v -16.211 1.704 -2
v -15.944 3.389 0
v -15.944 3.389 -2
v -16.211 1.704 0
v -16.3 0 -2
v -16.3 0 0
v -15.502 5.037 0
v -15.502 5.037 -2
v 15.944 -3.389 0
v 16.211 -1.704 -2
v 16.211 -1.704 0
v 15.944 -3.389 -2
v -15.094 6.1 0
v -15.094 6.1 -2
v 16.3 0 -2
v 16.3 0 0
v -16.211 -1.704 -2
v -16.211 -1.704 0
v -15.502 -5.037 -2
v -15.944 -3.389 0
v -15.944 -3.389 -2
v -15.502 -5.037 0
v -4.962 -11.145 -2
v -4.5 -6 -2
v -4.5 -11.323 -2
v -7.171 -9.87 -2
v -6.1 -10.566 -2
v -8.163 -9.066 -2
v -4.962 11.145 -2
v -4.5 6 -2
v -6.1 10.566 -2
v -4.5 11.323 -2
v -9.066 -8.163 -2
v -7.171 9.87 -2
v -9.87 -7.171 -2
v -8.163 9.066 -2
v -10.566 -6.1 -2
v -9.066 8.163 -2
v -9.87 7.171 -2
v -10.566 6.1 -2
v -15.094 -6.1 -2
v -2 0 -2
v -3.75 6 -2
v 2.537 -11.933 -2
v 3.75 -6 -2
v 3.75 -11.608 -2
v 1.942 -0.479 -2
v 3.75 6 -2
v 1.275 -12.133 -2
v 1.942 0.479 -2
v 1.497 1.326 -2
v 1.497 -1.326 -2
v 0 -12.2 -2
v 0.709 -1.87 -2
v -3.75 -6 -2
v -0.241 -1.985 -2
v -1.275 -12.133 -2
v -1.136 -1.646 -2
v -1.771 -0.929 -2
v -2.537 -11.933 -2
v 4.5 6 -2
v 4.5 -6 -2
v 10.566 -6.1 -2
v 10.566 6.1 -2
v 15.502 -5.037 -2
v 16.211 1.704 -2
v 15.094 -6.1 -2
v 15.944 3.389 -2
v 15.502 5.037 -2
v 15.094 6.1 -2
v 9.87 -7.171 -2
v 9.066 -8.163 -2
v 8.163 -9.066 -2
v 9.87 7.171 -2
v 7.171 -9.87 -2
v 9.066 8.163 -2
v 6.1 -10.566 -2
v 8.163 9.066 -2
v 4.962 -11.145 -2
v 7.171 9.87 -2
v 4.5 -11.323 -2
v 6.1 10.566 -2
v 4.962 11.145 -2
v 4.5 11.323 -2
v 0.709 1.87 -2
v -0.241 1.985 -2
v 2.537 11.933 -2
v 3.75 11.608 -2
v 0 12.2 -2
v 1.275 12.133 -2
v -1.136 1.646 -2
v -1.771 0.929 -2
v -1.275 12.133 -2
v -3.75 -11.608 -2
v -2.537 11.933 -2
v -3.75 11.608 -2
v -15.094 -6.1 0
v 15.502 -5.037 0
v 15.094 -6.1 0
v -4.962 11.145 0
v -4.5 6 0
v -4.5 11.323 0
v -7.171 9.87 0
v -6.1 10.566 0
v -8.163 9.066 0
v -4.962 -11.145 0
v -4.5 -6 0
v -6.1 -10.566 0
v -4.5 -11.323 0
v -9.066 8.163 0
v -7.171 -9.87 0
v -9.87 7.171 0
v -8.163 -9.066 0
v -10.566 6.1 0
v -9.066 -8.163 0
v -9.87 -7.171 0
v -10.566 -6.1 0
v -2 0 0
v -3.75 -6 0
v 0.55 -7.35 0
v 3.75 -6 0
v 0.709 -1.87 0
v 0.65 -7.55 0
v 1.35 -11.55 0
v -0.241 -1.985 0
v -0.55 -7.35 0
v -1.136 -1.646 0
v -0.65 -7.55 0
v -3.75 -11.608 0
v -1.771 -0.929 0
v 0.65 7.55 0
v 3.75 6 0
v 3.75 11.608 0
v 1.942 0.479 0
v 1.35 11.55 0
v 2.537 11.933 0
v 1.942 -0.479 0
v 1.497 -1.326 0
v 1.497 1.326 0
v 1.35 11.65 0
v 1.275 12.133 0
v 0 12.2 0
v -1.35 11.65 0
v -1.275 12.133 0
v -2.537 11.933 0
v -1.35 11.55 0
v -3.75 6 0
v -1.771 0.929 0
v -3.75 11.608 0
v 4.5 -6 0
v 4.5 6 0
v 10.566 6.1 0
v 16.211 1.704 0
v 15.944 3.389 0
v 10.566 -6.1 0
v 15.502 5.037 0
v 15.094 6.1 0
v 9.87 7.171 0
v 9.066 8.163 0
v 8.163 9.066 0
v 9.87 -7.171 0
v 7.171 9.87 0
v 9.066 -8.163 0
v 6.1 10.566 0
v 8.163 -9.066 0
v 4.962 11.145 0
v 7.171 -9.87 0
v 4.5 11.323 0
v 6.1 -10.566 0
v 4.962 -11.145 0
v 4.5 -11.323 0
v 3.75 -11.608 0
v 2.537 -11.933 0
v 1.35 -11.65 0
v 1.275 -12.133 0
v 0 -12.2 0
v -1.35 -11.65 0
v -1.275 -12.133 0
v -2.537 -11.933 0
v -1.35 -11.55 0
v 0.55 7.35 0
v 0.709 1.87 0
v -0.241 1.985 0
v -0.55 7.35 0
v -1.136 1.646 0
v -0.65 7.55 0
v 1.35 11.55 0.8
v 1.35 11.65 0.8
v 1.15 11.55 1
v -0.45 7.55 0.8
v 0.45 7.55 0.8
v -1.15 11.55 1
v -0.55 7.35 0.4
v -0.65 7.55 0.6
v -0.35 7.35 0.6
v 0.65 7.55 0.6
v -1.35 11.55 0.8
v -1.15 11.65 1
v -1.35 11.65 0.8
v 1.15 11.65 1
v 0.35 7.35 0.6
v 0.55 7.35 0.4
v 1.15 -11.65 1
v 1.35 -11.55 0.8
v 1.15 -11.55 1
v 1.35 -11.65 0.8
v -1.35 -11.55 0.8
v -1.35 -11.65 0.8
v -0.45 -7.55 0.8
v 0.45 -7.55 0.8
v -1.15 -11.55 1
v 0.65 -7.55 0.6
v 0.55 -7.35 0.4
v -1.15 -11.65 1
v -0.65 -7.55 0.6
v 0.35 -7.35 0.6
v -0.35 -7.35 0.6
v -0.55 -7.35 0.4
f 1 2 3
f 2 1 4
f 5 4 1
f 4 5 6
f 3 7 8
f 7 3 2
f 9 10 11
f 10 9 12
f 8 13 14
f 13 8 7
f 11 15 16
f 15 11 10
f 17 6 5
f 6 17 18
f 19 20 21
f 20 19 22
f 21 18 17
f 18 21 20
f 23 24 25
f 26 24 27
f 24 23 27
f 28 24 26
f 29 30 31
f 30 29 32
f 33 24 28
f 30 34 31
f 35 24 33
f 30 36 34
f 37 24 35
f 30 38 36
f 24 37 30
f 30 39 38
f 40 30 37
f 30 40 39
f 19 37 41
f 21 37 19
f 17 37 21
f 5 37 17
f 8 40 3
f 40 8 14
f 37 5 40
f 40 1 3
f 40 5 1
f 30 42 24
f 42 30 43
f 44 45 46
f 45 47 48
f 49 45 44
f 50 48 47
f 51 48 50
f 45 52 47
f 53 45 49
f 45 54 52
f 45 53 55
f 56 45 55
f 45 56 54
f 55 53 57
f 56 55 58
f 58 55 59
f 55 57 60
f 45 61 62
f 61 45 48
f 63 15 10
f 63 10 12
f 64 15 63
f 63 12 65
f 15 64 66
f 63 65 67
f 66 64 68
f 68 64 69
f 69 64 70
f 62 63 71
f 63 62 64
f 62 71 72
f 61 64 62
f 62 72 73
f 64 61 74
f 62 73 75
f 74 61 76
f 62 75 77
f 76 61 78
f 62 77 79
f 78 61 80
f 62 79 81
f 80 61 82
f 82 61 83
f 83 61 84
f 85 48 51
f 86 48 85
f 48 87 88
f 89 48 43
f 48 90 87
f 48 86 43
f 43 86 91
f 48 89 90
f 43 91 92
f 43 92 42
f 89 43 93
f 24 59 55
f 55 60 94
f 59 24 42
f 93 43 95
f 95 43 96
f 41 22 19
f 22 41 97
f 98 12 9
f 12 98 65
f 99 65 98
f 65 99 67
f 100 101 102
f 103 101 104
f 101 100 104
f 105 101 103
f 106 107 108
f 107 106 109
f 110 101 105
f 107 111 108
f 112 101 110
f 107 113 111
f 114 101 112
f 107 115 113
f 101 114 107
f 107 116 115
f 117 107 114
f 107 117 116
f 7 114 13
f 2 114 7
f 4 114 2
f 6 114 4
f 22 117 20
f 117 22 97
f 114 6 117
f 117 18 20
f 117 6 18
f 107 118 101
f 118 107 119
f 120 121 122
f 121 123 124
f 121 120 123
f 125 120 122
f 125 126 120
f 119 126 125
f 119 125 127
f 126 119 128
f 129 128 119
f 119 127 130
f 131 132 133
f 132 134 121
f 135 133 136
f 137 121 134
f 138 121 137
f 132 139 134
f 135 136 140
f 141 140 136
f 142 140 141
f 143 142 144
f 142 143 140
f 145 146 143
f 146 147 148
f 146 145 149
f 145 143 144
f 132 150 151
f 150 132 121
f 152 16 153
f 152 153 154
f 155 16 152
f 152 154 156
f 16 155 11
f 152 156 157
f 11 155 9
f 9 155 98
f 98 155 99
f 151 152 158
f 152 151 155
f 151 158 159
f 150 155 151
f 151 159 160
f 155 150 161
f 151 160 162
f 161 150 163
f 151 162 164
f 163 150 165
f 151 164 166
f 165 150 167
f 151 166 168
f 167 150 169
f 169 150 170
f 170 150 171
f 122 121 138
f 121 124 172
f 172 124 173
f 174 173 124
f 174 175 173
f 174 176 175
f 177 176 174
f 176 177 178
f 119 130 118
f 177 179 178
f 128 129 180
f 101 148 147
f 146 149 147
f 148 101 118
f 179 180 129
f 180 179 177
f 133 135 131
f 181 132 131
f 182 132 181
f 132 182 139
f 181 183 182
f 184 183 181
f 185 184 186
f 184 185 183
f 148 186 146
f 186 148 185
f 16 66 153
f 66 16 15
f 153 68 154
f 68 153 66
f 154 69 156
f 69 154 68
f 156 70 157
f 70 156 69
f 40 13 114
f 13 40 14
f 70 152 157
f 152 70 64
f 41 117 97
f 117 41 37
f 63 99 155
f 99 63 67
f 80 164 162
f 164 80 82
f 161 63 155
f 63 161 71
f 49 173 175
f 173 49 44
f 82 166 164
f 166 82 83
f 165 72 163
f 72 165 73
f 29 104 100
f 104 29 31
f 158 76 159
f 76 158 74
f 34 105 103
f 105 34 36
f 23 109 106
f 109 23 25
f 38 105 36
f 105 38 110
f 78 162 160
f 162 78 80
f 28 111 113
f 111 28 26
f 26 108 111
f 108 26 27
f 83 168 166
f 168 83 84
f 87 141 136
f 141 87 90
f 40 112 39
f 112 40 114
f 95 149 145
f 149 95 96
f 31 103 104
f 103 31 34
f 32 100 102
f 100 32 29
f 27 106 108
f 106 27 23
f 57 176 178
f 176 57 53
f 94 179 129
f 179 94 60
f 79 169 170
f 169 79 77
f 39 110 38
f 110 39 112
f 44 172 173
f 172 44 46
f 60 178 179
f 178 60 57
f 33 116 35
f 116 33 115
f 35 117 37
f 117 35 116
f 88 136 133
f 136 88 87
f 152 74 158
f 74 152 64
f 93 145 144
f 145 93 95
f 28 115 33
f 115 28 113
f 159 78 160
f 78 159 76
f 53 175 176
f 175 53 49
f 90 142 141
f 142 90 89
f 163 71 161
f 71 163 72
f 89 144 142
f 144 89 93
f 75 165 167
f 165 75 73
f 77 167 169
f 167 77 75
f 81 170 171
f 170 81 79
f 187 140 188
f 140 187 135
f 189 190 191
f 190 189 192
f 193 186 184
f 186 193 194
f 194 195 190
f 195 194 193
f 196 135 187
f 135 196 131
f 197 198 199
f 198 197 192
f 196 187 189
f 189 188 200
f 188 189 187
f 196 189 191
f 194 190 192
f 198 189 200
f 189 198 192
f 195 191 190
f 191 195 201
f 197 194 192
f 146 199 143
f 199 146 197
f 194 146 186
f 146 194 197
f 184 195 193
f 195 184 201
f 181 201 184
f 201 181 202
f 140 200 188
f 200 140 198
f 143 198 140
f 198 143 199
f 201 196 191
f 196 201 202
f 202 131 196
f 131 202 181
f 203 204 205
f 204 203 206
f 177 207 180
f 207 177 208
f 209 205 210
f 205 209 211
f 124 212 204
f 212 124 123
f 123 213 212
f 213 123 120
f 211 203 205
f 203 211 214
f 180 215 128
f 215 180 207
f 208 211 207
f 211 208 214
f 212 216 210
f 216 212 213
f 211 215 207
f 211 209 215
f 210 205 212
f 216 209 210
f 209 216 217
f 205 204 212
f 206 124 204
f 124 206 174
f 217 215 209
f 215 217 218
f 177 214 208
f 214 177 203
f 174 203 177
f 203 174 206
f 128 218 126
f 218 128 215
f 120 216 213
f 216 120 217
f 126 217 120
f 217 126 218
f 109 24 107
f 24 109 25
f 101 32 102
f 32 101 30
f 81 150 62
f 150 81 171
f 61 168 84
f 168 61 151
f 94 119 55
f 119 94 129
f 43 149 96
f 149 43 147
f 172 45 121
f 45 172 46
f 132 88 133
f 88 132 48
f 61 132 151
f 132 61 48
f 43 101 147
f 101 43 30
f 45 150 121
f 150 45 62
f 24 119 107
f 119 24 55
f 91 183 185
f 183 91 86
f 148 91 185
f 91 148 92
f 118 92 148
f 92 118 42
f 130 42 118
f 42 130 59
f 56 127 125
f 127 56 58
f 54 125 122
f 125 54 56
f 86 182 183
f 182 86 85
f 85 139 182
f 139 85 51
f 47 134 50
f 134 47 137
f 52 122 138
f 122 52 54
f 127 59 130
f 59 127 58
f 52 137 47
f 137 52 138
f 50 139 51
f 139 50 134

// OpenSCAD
$fs = 1;
$fa = 6;

qmod1=28.8+0.2; // quarter mount outer diameter (was 30)
qmod2=24.9+0.2; // quarter mount inner diameter (was 26)

module index(inflate = 0) {
    xoffset = 20;
    difference() {
        hull() {
            scale([1,1,1]) holderBody();
            translate([xoffset,0,0]) cylinder(d=10, h=10, center=false);
        }
        shell();
        translate([xoffset+1,0,0]) cylinder(d=3, h=100, center=true);
    }
}

module shell(inflate=0, height = 10) {
    cylinder(d=36 + inflate, h=height, center=false, $fn=60);
}
module bodyCutouts() {
    // form the lip that holds the cleat tabs
    translate([0,0,1.25]) cylinder(d=qmod1, h=100, center=false, $fn=60);
    // make the through-hole for the cleat body
    cylinder(d=qmod2, h=100, center=true, $fn=60);
    // make the cutout to insert the cleat tabs
    cleatTabs(5, 1.5, 5.1, cutout = 1);
}
module bodyAdditions() {
    // 24-8-2025 it looks like that
    // the additions each make a "dent" of 0.7mm  
    // 31-28.7=2.3mm
    bad=3; // body addition diameter
    bay=(qmod1+bad)/2-0.7; // instead of 31.25/2
    
    translate([0, bay, 0]) cylinder(d=bad, h=5, center=false, $fn=30);
    #translate([0, -bay, 0]) cylinder(d=bad, h=5, center=false, $fn=30);
}
module holderBody() {
    difference() {
        shell();
        bodyCutouts();
    }
    bodyAdditions();
}
module cleatSmallCyl(height=3, inflate = 0) {
    cylinder(d=inflate + 24.9, h=height, center=false, $fn=60);
}
module cleatLargeCyl(h=1.5, inflate = 0) {
    cylinder(d=inflate + 28.6, h=h, center=false, $fn=60);
}
module cleatTabs(inflateX = 0, inflateY = 0, height = 1.5, cutout = 0) {
    intersection() {
        translate([0, 0, -cutout]) cleatLargeCyl(height + cutout, inflateX);
        cube([100, 11 + inflateY, 100], center=true);
    }
}
module indent(depth = 1, inflateX= 0, inflateY = 0) {
    hull() {
        translate([11.95 + inflateX, 0, 0]) cube([0.1, 2.5 + inflateY, depth * 2], center=true);
        translate([0, 0, -1.1]) cube([1, 0.1, 0.1], center=true);
    }
}
module indents(depth = 1) {
    indent(depth);
    rotate([0, 0, 180]) indent(depth);
}
module cleat() {
    cleatSmallCyl(3);
    cleatTabs();
}

module insertIndent(depth = 1, inflateX= 0, inflateY = 0) {
    // indent is 2.7 wide at d=23.6
    inw1=2.7;
    icd1=23.6-0.2;
    // indent is 1.3 wide at d=15
    inw2=1.3;
    icd2=15.0+0.2;
    // construct
    rotate([0, 0, 90]) hull() {
        // start from the outside
        translate([icd1/2 + inflateX - 0.1, 0, 0]) {
            cube([0.1, inw1-0.4, (depth-0.0)*2], center=true);
            cube([0.1, inw1,     (depth-0.2) * 2], center=true);
        }
        // inside
        translate([icd2/2 + inflateX, 0, 0]) {
            cube([0.1, inw2-0.4, (depth-0.2)*2], center=true);
            cube([0.1, inw2,     (depth-0.4) * 2], center=true);
        }  
        // and round it off      
        translate([icd2/2-0.2, 0, 0]) { 
            cube([0.1, inw2-0.6, (depth-0.4) * 2], center=true);
            cube([0.1, inw2-0.2, (depth-0.6) * 2], center=true);
        }
    }
}

module insert() {
    // glue-in insert to secure the cleat
    difference() {
        union() {
            cleatSmallCyl(height = 2, inflate = -0.5);
            cleatTabs(4, 1.2, height = 2);
            rotate([0, 180, 0]) insertIndent(1, 0, -0.5);
            rotate([0, 180, 180]) insertIndent(1, 0, -0.5);
        }
        // make bendy wing things
        difference() {
            cube([9, 100, 100], center = true);
            cube([7.5, 100, 100], center = true);
            cube([100, 12, 100], center = true);
        }
        cylinder(d=4, h=10, center=true);
    }
}

*translate([0, 0, 2.75]) rotate([0, 180, 90]) difference() {
    cleat();
    indents(1);
}
holderBody();
!rotate([0, 180, 0]) insert();
